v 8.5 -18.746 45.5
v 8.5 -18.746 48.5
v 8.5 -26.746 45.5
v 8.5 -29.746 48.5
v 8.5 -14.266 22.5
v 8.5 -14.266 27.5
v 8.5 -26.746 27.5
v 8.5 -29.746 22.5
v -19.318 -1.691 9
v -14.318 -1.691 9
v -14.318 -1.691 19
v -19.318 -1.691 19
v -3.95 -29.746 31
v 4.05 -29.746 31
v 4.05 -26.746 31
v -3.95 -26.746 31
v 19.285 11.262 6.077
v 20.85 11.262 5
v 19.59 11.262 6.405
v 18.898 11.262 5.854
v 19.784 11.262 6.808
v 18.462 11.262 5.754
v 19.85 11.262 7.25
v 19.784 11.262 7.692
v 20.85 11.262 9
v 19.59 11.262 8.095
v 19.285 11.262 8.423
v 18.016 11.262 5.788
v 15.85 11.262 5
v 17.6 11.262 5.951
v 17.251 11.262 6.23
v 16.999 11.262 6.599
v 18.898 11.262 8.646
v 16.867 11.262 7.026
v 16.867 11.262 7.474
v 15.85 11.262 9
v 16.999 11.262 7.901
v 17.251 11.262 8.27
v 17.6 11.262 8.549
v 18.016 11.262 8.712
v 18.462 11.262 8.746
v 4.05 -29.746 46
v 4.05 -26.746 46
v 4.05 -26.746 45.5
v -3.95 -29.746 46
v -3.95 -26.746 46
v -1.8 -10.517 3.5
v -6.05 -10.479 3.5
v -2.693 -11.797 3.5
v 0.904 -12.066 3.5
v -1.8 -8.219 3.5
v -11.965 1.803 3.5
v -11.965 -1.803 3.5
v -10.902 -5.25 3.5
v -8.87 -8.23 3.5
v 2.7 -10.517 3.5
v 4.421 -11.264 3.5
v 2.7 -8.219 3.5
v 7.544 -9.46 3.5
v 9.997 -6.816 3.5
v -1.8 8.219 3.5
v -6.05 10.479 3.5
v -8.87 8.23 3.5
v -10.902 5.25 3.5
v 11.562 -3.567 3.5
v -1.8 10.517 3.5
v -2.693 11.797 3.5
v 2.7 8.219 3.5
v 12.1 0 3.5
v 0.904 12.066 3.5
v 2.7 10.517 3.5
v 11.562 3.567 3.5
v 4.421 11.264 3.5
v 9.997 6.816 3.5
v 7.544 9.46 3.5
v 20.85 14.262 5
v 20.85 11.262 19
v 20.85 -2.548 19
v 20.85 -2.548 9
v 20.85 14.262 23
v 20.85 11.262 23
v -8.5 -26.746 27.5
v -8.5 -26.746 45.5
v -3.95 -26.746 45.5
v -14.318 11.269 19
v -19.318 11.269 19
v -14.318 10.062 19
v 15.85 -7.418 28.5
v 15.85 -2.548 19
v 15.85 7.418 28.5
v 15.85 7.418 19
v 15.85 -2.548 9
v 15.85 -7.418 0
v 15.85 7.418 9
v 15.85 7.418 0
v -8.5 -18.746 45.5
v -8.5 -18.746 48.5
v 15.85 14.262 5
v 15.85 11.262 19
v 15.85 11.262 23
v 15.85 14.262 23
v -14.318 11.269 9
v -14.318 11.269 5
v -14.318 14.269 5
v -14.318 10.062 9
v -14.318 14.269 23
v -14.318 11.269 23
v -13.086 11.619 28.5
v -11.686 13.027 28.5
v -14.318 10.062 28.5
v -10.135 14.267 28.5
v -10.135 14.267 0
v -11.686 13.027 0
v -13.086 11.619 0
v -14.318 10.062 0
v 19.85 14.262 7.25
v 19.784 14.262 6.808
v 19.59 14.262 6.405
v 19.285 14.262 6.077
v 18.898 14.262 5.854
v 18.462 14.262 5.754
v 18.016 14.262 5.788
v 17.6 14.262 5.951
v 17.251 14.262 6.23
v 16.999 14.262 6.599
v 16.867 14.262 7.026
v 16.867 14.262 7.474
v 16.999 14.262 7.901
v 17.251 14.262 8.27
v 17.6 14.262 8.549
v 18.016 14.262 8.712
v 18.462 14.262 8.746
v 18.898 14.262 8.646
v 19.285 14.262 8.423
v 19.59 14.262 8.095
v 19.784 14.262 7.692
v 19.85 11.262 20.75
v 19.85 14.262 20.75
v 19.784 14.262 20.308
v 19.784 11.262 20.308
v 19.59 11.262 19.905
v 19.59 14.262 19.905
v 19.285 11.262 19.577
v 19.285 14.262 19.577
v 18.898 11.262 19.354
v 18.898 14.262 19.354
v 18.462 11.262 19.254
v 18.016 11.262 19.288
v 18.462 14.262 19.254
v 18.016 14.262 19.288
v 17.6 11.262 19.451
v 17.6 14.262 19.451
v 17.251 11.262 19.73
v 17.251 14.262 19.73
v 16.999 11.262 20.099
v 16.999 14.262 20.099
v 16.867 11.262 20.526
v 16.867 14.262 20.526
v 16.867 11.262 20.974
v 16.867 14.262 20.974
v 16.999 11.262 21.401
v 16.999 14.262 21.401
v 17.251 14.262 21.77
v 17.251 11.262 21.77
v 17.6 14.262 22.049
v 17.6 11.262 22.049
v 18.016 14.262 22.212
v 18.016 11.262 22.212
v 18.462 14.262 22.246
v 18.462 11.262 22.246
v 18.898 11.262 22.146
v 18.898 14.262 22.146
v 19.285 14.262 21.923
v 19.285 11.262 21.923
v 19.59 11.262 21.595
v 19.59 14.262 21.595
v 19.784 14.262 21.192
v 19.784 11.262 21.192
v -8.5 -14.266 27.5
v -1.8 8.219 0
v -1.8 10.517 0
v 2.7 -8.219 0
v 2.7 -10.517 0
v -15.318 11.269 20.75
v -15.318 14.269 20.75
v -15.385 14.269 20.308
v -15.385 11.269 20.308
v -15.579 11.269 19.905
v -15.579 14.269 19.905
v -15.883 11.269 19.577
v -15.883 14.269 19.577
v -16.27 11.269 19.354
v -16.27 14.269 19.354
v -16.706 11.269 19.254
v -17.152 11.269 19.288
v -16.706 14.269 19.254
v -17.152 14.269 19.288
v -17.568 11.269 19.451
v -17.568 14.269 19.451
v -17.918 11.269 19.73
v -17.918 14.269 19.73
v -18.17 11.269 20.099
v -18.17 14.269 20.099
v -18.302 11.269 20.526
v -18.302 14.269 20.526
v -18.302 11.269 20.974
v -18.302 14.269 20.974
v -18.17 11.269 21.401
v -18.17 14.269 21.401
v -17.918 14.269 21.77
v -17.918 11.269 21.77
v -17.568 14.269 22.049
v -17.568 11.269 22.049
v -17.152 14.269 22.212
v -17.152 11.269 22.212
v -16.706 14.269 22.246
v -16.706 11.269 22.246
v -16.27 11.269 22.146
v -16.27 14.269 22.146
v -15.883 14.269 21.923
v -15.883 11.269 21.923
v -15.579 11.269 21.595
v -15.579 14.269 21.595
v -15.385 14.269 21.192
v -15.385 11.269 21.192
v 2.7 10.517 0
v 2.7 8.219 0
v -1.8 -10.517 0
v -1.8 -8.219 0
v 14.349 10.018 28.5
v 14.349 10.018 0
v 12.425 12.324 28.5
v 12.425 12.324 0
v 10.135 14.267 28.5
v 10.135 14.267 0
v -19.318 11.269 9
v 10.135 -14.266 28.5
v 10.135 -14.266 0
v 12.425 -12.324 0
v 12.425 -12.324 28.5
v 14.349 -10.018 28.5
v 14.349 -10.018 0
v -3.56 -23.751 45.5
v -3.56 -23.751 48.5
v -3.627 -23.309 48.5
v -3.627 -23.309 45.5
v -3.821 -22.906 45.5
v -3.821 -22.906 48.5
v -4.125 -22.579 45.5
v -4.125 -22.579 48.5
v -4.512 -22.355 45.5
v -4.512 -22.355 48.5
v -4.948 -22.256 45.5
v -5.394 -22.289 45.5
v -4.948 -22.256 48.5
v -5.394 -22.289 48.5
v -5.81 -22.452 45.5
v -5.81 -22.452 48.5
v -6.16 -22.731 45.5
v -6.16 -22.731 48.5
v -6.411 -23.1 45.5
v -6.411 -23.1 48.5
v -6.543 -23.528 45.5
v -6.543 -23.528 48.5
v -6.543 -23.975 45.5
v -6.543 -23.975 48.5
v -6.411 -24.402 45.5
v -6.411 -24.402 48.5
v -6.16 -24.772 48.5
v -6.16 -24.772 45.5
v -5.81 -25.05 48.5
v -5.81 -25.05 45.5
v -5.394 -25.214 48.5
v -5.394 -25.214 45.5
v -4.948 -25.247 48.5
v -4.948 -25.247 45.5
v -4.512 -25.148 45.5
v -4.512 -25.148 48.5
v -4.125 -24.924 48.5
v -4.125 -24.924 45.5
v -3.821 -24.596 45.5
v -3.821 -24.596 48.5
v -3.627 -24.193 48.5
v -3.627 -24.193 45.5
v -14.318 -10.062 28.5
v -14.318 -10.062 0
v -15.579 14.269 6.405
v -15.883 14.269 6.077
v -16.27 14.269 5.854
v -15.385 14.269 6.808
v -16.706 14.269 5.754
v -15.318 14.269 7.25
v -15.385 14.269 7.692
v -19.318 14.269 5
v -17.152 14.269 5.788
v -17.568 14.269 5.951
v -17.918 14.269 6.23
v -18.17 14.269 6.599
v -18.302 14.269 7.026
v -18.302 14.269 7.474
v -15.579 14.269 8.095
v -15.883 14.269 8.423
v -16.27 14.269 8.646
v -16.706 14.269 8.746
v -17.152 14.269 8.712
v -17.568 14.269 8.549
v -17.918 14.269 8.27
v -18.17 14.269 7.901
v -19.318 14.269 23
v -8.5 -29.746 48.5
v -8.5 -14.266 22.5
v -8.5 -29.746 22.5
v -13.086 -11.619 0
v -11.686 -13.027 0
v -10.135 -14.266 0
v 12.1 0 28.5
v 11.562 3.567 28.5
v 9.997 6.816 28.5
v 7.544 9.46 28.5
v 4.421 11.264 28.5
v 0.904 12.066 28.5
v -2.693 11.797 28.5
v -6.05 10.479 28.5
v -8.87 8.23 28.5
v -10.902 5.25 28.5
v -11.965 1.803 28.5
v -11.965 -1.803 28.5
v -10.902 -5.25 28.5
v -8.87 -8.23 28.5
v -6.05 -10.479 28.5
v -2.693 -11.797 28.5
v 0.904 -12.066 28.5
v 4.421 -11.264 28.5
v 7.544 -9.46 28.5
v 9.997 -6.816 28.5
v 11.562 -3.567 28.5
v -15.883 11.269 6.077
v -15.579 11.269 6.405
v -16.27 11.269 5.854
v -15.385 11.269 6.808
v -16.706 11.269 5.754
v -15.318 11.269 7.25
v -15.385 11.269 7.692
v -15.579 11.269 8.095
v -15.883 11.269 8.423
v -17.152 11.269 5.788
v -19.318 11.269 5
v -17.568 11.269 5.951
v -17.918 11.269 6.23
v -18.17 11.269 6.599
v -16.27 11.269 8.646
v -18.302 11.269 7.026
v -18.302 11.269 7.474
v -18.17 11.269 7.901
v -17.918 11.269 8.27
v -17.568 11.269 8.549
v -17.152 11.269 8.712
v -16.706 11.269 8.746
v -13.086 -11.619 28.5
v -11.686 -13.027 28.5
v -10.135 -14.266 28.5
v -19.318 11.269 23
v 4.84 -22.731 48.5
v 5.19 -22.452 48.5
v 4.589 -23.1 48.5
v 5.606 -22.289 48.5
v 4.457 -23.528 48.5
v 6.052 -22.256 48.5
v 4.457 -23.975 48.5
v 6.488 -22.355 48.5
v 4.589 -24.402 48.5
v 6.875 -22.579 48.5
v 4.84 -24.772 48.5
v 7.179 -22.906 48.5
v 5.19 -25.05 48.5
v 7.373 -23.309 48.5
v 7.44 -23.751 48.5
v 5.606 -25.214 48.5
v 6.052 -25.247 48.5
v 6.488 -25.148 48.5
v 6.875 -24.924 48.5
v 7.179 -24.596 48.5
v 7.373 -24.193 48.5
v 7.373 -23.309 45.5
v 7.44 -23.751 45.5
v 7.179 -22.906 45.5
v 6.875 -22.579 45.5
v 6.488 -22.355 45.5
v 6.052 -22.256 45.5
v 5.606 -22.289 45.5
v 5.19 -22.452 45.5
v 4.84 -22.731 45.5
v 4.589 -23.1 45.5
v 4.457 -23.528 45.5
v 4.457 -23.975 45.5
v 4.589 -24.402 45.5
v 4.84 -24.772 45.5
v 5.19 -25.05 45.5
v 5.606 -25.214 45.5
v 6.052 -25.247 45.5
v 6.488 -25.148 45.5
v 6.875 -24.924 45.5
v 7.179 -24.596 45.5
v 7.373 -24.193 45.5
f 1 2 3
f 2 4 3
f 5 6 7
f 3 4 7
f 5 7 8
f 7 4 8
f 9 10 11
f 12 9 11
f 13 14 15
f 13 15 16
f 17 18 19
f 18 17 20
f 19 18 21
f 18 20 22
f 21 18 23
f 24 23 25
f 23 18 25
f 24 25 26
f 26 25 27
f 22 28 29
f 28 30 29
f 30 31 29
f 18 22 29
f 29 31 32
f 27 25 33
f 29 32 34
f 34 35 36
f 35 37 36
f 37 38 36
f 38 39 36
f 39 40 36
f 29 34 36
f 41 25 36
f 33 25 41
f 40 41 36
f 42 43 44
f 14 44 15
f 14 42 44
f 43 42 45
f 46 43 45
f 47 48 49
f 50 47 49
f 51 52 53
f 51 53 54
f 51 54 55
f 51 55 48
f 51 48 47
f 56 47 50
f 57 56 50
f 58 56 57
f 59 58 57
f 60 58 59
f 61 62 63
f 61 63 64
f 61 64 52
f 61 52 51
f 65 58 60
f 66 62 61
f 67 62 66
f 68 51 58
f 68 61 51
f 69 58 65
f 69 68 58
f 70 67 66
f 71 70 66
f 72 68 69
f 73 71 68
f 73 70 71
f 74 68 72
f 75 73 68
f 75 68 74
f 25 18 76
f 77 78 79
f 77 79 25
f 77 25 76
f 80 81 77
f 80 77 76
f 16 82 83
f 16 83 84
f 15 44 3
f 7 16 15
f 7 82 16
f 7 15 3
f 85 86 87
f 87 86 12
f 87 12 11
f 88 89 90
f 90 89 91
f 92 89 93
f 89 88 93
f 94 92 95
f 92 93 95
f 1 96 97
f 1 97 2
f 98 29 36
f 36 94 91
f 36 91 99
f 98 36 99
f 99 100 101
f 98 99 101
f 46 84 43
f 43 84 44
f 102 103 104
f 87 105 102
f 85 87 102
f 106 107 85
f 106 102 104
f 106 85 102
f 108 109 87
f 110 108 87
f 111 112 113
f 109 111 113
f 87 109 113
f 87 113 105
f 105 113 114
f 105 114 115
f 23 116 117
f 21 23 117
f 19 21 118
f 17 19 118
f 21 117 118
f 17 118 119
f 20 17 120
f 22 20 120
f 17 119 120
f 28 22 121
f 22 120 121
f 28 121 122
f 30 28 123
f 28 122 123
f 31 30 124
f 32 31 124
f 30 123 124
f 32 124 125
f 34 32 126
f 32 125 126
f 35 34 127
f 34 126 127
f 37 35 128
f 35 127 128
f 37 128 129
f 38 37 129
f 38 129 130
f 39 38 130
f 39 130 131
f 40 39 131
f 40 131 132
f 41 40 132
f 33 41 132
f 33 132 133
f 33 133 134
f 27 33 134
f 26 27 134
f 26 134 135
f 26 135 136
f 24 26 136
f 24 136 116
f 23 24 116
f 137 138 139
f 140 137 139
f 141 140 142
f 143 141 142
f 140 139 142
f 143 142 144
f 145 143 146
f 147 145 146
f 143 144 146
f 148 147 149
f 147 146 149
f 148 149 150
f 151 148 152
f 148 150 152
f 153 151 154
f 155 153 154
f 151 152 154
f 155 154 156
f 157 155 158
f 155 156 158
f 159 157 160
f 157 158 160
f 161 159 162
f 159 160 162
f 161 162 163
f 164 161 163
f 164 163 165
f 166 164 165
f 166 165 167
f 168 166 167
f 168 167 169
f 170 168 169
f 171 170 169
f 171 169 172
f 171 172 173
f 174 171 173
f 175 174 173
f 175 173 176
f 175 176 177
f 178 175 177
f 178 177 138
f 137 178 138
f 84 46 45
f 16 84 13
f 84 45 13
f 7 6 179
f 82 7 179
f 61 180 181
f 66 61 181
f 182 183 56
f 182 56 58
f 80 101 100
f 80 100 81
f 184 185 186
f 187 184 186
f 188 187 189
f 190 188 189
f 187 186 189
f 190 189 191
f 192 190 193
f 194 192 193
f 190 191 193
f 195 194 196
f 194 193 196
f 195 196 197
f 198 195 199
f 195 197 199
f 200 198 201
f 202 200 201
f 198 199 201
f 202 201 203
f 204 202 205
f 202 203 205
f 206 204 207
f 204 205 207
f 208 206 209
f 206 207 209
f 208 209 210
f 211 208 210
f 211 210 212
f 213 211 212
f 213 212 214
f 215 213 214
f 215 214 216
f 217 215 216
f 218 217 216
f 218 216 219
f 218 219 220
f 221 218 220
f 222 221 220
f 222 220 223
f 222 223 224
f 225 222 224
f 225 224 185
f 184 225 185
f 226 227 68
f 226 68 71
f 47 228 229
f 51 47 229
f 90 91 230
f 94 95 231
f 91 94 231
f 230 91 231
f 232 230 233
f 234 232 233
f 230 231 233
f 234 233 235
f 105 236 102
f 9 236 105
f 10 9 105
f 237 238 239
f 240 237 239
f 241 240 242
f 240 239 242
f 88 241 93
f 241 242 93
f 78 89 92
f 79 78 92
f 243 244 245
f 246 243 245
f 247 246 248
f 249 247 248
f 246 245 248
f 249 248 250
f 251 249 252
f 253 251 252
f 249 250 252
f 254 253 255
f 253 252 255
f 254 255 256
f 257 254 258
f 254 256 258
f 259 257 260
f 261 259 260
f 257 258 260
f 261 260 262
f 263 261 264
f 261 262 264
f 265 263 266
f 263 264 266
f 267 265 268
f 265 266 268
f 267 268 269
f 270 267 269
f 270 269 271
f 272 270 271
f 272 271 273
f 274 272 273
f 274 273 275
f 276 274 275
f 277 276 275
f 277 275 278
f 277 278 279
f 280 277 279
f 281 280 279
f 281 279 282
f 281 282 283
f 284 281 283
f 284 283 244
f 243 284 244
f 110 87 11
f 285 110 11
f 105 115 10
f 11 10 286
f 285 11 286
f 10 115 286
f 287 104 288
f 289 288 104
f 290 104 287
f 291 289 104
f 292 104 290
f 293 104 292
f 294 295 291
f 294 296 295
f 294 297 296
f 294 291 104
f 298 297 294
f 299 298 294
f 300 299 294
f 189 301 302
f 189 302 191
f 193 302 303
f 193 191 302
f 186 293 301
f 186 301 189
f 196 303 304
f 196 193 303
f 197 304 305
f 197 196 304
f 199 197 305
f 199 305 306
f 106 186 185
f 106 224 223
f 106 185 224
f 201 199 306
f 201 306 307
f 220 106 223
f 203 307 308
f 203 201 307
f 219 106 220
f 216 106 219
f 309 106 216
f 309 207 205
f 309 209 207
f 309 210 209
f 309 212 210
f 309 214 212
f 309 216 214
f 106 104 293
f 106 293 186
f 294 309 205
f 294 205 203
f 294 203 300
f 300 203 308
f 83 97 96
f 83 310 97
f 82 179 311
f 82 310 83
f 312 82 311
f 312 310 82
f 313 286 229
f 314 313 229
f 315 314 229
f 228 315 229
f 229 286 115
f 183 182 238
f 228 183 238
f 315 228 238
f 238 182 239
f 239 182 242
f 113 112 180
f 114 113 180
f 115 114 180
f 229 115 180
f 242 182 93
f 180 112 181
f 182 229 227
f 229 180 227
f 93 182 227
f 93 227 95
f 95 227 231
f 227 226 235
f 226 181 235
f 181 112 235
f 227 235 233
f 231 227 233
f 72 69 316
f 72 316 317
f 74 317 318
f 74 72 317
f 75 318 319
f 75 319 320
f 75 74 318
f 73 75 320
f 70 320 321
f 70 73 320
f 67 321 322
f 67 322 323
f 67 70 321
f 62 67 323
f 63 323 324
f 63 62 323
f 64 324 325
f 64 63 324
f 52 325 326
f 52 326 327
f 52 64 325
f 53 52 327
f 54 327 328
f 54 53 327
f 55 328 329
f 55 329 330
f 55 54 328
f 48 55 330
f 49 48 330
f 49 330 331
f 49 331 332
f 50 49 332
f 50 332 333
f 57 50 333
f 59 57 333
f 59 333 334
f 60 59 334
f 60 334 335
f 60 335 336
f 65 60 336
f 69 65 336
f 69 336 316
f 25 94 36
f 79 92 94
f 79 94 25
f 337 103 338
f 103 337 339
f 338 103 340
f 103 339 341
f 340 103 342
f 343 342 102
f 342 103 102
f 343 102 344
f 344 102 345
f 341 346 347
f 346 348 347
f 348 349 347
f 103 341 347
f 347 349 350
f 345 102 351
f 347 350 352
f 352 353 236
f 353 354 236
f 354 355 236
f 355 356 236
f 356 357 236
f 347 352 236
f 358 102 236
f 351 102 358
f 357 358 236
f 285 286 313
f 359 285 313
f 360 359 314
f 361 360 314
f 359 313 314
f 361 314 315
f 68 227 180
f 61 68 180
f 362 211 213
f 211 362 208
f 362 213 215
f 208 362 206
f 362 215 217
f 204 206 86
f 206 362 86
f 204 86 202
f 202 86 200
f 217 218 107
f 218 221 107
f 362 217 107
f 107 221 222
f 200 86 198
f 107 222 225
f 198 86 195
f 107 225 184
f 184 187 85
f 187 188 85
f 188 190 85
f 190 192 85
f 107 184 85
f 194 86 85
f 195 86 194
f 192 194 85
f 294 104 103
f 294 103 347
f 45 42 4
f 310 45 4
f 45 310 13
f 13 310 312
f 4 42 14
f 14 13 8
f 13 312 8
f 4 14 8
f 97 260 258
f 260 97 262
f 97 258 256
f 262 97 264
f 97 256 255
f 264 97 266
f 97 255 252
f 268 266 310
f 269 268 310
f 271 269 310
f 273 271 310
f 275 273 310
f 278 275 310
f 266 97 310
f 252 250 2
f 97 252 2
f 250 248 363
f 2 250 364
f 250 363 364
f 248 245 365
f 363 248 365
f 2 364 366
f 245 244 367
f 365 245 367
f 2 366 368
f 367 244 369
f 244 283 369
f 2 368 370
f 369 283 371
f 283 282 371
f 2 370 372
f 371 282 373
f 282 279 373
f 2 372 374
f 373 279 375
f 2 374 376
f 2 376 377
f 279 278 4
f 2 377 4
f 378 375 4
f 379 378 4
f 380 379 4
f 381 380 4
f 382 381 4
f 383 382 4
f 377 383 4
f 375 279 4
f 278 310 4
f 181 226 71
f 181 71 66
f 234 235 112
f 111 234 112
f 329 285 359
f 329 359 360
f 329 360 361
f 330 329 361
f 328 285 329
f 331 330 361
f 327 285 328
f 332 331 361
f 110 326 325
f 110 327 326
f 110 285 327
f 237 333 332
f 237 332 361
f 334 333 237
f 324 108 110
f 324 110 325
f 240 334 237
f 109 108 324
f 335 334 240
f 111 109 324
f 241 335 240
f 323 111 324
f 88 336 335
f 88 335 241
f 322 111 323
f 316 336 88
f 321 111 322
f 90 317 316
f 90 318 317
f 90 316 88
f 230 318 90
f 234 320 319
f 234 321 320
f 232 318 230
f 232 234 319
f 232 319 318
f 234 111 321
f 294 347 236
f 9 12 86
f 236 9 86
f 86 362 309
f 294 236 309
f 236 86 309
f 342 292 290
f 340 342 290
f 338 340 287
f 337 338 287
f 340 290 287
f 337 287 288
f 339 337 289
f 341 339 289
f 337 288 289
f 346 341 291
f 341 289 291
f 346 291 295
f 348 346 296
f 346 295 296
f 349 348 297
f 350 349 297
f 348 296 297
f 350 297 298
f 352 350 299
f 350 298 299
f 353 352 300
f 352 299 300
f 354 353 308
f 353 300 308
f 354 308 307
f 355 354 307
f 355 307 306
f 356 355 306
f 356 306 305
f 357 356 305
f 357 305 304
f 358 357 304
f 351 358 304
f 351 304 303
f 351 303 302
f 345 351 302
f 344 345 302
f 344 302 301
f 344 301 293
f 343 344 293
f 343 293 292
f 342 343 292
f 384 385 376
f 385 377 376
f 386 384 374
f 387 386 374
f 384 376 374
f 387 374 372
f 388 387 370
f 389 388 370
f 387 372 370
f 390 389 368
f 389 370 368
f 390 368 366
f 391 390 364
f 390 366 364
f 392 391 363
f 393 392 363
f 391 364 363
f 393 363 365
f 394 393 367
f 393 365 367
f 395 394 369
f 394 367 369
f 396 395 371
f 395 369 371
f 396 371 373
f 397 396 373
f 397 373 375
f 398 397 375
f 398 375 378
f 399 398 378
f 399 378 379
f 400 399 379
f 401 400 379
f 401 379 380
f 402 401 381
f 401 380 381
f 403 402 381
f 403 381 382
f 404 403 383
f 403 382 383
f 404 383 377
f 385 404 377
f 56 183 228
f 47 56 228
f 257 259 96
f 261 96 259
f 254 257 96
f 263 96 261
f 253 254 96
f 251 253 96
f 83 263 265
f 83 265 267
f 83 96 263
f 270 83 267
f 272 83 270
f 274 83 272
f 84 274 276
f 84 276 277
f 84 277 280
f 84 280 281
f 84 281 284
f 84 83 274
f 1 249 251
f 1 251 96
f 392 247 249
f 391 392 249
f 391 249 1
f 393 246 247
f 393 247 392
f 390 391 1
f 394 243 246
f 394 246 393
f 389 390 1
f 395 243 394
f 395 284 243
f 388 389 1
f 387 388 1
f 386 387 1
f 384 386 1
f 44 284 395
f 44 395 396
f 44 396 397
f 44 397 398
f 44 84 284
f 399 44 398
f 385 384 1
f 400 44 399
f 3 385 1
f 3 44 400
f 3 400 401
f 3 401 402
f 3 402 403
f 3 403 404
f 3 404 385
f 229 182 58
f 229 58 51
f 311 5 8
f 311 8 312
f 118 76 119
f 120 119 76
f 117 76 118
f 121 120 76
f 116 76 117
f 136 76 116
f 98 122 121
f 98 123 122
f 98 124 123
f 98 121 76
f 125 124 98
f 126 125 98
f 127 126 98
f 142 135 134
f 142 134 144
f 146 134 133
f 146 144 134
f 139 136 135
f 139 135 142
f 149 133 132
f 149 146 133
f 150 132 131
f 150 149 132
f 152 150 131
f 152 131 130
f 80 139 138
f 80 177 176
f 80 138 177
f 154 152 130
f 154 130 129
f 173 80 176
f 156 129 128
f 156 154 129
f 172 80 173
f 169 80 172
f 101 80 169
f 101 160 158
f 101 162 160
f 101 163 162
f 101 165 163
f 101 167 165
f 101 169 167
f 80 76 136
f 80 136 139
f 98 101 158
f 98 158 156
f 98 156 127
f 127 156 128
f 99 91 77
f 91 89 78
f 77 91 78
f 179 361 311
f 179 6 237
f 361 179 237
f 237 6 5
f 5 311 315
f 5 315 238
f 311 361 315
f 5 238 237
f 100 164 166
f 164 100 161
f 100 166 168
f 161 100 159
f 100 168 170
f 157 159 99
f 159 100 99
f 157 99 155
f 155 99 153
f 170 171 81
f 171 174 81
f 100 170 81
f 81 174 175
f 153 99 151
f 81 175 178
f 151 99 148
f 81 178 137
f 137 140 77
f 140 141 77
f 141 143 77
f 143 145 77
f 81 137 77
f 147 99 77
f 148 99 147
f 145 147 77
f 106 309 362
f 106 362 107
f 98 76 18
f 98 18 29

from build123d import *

# Parameters (mm, degrees)
SKETCH1_R               = 12.1
BOSS_EXTRUDE1_DEPTH     = 3.5
SKETCH1_4_R             = 12.1
BOSS_EXTRUDE2_DEPTH     = 28.5
SKETCH3_W               = 4.5
SKETCH3_H               = 2.297717899
CUT_EXTRUDE1_DEPTH      = 1
CUT_EXTRUDE1_DEPTH_BACK = 29.5
SKETCH6_W               = 17
SKETCH6_H               = 5
BOSS_EXTRUDE4_DEPTH     = 15.48
SKETCH7_W               = 17
SKETCH7_H               = 3
BOSS_EXTRUDE5_DEPTH     = 21
SKETCH10_W              = 8
SKETCH10_H              = 15
CUT_EXTRUDE4_DEPTH      = 5
SKETCH12_W              = 17
SKETCH12_H              = 3
BOSS_EXTRUDE8_DEPTH     = 8
SKETCH9_R               = 1.5
CUT_EXTRUDE5_DEPTH      = 4
SKETCH13_W              = 10
SKETCH13_H              = 4
BOSS_EXTRUDE9_DEPTH     = 5
SKETCH15_W              = 5
SKETCH15_H              = 10
BOSS_EXTRUDE10_DEPTH    = 11.96
SKETCH17_W              = 5
SKETCH17_H              = 3
BOSS_EXTRUDE11_DEPTH    = 4
SKETCH16_W              = 5
SKETCH16_H              = 3
BOSS_EXTRUDE12_DEPTH    = 4
SKETCH20_W              = 10
SKETCH20_H              = 4
BOSS_EXTRUDE13_DEPTH    = 5
SKETCH22_W              = 5
SKETCH22_H              = 10
BOSS_EXTRUDE14_DEPTH    = 12.81
SKETCH26_W              = 5
SKETCH26_H              = 3
BOSS_EXTRUDE15_DEPTH    = 4
SKETCH25_W              = 5
SKETCH25_H              = 3
BOSS_EXTRUDE16_DEPTH    = 4
SKETCH27_R              = 1.5
CUT_EXTRUDE7_DEPTH      = 1.006326947
CUT_EXTRUDE7_DEPTH_BACK = 45.008836986
SKETCH28_R              = 1.5
CUT_EXTRUDE8_DEPTH      = 1
CUT_EXTRUDE8_DEPTH_BACK = 45.015163933


with BuildPart() as part:
    # Sketch1 → Boss-Extrude1 (new body)
    with BuildSketch(Plane.XY):
        Circle(SKETCH1_R)
    extrude(amount=BOSS_EXTRUDE1_DEPTH)

    # Sketch1<4> → Boss-Extrude2 (add)
    with BuildSketch(Plane.XY):
        with BuildLine():
            Line((10.134542374, 14.266781377), (-10.134542374, 14.266781377))
            ThreePointArc((-10.134542374, 14.266781377), (-12.405882938, 12.342773939), (-14.318281607, 10.061650551))
            Line((-14.318281607, 10.061650551), (-14.318281607, -10.061650551))
            ThreePointArc((-14.318281607, -10.061650551), (-12.406080895, -12.342574968), (-10.135, -14.266456287))
            Line((-10.135, -14.266456287), (10.135, -14.266456287))
            ThreePointArc((10.135, -14.266456287), (13.436306455, -11.212299891), (15.850202646, -7.417619301))
            Line((15.850202646, -7.417619301), (15.850202646, 7.417619301))
            ThreePointArc((15.850202646, 7.417619301), (13.436126626, 11.212515386), (10.134542374, 14.266781377))
        make_face()
        Circle(SKETCH1_4_R, mode=Mode.SUBTRACT)
    extrude(amount=BOSS_EXTRUDE2_DEPTH)

    # Sketch3 → Cut-Extrude1 (cut, two sides)
    with BuildSketch(Plane(origin=(0, 0, 0), x_dir=(-1, 0, 0), z_dir=(0, 0, -1))) as cut_extrude1_sk:
        with Locations((-0.45, 9.367922428)):
            Rectangle(SKETCH3_W, SKETCH3_H)
        with Locations((-0.45, -9.367922428)):
            Rectangle(SKETCH3_W, SKETCH3_H)
    extrude(amount=CUT_EXTRUDE1_DEPTH, mode=Mode.SUBTRACT)
    extrude(cut_extrude1_sk.sketch, amount=-CUT_EXTRUDE1_DEPTH_BACK, mode=Mode.SUBTRACT)

    # Sketch6 → Boss-Extrude4 (add)
    with BuildSketch(Plane(origin=(0, -14.266456287, 0), x_dir=(-1, 0, 0), z_dir=(0, -1, 0))):
        with Locations((0, -25)):
            Rectangle(SKETCH6_W, SKETCH6_H)
    extrude(amount=BOSS_EXTRUDE4_DEPTH)

    # Sketch7 → Boss-Extrude5 (add)
    with BuildSketch(Plane.XY.offset(27.5)):
        with Locations((0, -28.246456287)):
            Rectangle(SKETCH7_W, SKETCH7_H)
    extrude(amount=BOSS_EXTRUDE5_DEPTH)

    # Sketch10 → Cut-Extrude4 (cut, symmetric)
    with BuildSketch(Plane(origin=(0, -29.746456287, 0), x_dir=(-1, 0, 0), z_dir=(0, -1, 0))):
        with Locations((-0.050406815, -38.5)):
            Rectangle(SKETCH10_W, SKETCH10_H)
    extrude(amount=CUT_EXTRUDE4_DEPTH, both=True, mode=Mode.SUBTRACT)

    # Sketch12 → Boss-Extrude8 (add)
    with BuildSketch(Plane(origin=(0, -26.746456287, 0), x_dir=(1, 0, 0), z_dir=(0, 1, 0))):
        with Locations((0, -47)):
            Rectangle(SKETCH12_W, SKETCH12_H)
    extrude(amount=BOSS_EXTRUDE8_DEPTH)

    # Sketch9 → Cut-Extrude5 (cut, symmetric)
    with BuildSketch(Plane.XY.offset(48.5)):
        with Locations((-5.060010985, -23.75132246)):
            Circle(SKETCH9_R)
        with Locations((5.939989015, -23.75132246)):
            Circle(SKETCH9_R)
    extrude(amount=CUT_EXTRUDE5_DEPTH, both=True, mode=Mode.SUBTRACT)

    # Sketch13 → Boss-Extrude9 (add)
    with BuildSketch(Plane.ZY.offset(14.318281607)):
        with Locations((14, 0.308707646)):
            Rectangle(SKETCH13_W, SKETCH13_H)
    extrude(amount=BOSS_EXTRUDE9_DEPTH)

    # Sketch15 → Boss-Extrude10 (add)
    with BuildSketch(Plane(origin=(0, 2.308707646, 0), x_dir=(1, 0, 0), z_dir=(0, 1, 0))):
        with Locations((-16.818281607, -14)):
            Rectangle(SKETCH15_W, SKETCH15_H)
    extrude(amount=BOSS_EXTRUDE10_DEPTH)

    # Sketch17 → Boss-Extrude11 (add)
    with BuildSketch(Plane.XY.offset(19)):
        with Locations((-16.818281607, 12.768707646)):
            Rectangle(SKETCH17_W, SKETCH17_H)
    extrude(amount=BOSS_EXTRUDE11_DEPTH)

    # Sketch16 → Boss-Extrude12 (add)
    with BuildSketch(Plane(origin=(0, 0, 9), x_dir=(-1, 0, 0), z_dir=(0, 0, -1))):
        with Locations((16.818281607, 12.768707646)):
            Rectangle(SKETCH16_W, SKETCH16_H)
    extrude(amount=BOSS_EXTRUDE12_DEPTH)

    # Sketch20 → Boss-Extrude13 (add)
    with BuildSketch(Plane(origin=(15.850202646, 0, 0), x_dir=(0, 0, -1), z_dir=(1, 0, 0))):
        with Locations((-14, -0.547619301)):
            Rectangle(SKETCH20_W, SKETCH20_H)
    extrude(amount=BOSS_EXTRUDE13_DEPTH)

    # Sketch22 → Boss-Extrude14 (add)
    with BuildSketch(Plane(origin=(0, 1.452380699, 0), x_dir=(1, 0, 0), z_dir=(0, 1, 0))):
        with Locations((18.350202646, -14)):
            Rectangle(SKETCH22_W, SKETCH22_H)
    extrude(amount=BOSS_EXTRUDE14_DEPTH)

    # Sketch26 → Boss-Extrude15 (add)
    with BuildSketch(Plane.XY.offset(19)):
        with Locations((18.350202646, 12.762380699)):
            Rectangle(SKETCH26_W, SKETCH26_H)
    extrude(amount=BOSS_EXTRUDE15_DEPTH)

    # Sketch25 → Boss-Extrude16 (add)
    with BuildSketch(Plane(origin=(0, 0, 9), x_dir=(-1, 0, 0), z_dir=(0, 0, -1))):
        with Locations((-18.350202646, 12.762380699)):
            Rectangle(SKETCH25_W, SKETCH25_H)
    extrude(amount=BOSS_EXTRUDE16_DEPTH)

    # Sketch27 → Cut-Extrude7 (cut, two sides)
    with BuildSketch(Plane(origin=(0, 14.262380699, 0), x_dir=(1, 0, 0), z_dir=(0, 1, 0))) as cut_extrude7_sk:
        with Locations((18.350202646, -20.75)):
            Circle(SKETCH27_R)
        with Locations((18.350202646, -7.25)):
            Circle(SKETCH27_R)
    extrude(amount=CUT_EXTRUDE7_DEPTH, mode=Mode.SUBTRACT)
    extrude(cut_extrude7_sk.sketch, amount=-CUT_EXTRUDE7_DEPTH_BACK, mode=Mode.SUBTRACT)

    # Sketch28 → Cut-Extrude8 (cut, two sides)
    with BuildSketch(Plane(origin=(0, 14.268707646, 0), x_dir=(1, 0, 0), z_dir=(0, 1, 0))) as cut_extrude8_sk:
        with Locations((-16.818281607, -7.25)):
            Circle(SKETCH28_R)
        with Locations((-16.818281607, -20.75)):
            Circle(SKETCH28_R)
    extrude(amount=CUT_EXTRUDE8_DEPTH, mode=Mode.SUBTRACT)
    extrude(cut_extrude8_sk.sketch, amount=-CUT_EXTRUDE8_DEPTH_BACK, mode=Mode.SUBTRACT)


solid = part.part
